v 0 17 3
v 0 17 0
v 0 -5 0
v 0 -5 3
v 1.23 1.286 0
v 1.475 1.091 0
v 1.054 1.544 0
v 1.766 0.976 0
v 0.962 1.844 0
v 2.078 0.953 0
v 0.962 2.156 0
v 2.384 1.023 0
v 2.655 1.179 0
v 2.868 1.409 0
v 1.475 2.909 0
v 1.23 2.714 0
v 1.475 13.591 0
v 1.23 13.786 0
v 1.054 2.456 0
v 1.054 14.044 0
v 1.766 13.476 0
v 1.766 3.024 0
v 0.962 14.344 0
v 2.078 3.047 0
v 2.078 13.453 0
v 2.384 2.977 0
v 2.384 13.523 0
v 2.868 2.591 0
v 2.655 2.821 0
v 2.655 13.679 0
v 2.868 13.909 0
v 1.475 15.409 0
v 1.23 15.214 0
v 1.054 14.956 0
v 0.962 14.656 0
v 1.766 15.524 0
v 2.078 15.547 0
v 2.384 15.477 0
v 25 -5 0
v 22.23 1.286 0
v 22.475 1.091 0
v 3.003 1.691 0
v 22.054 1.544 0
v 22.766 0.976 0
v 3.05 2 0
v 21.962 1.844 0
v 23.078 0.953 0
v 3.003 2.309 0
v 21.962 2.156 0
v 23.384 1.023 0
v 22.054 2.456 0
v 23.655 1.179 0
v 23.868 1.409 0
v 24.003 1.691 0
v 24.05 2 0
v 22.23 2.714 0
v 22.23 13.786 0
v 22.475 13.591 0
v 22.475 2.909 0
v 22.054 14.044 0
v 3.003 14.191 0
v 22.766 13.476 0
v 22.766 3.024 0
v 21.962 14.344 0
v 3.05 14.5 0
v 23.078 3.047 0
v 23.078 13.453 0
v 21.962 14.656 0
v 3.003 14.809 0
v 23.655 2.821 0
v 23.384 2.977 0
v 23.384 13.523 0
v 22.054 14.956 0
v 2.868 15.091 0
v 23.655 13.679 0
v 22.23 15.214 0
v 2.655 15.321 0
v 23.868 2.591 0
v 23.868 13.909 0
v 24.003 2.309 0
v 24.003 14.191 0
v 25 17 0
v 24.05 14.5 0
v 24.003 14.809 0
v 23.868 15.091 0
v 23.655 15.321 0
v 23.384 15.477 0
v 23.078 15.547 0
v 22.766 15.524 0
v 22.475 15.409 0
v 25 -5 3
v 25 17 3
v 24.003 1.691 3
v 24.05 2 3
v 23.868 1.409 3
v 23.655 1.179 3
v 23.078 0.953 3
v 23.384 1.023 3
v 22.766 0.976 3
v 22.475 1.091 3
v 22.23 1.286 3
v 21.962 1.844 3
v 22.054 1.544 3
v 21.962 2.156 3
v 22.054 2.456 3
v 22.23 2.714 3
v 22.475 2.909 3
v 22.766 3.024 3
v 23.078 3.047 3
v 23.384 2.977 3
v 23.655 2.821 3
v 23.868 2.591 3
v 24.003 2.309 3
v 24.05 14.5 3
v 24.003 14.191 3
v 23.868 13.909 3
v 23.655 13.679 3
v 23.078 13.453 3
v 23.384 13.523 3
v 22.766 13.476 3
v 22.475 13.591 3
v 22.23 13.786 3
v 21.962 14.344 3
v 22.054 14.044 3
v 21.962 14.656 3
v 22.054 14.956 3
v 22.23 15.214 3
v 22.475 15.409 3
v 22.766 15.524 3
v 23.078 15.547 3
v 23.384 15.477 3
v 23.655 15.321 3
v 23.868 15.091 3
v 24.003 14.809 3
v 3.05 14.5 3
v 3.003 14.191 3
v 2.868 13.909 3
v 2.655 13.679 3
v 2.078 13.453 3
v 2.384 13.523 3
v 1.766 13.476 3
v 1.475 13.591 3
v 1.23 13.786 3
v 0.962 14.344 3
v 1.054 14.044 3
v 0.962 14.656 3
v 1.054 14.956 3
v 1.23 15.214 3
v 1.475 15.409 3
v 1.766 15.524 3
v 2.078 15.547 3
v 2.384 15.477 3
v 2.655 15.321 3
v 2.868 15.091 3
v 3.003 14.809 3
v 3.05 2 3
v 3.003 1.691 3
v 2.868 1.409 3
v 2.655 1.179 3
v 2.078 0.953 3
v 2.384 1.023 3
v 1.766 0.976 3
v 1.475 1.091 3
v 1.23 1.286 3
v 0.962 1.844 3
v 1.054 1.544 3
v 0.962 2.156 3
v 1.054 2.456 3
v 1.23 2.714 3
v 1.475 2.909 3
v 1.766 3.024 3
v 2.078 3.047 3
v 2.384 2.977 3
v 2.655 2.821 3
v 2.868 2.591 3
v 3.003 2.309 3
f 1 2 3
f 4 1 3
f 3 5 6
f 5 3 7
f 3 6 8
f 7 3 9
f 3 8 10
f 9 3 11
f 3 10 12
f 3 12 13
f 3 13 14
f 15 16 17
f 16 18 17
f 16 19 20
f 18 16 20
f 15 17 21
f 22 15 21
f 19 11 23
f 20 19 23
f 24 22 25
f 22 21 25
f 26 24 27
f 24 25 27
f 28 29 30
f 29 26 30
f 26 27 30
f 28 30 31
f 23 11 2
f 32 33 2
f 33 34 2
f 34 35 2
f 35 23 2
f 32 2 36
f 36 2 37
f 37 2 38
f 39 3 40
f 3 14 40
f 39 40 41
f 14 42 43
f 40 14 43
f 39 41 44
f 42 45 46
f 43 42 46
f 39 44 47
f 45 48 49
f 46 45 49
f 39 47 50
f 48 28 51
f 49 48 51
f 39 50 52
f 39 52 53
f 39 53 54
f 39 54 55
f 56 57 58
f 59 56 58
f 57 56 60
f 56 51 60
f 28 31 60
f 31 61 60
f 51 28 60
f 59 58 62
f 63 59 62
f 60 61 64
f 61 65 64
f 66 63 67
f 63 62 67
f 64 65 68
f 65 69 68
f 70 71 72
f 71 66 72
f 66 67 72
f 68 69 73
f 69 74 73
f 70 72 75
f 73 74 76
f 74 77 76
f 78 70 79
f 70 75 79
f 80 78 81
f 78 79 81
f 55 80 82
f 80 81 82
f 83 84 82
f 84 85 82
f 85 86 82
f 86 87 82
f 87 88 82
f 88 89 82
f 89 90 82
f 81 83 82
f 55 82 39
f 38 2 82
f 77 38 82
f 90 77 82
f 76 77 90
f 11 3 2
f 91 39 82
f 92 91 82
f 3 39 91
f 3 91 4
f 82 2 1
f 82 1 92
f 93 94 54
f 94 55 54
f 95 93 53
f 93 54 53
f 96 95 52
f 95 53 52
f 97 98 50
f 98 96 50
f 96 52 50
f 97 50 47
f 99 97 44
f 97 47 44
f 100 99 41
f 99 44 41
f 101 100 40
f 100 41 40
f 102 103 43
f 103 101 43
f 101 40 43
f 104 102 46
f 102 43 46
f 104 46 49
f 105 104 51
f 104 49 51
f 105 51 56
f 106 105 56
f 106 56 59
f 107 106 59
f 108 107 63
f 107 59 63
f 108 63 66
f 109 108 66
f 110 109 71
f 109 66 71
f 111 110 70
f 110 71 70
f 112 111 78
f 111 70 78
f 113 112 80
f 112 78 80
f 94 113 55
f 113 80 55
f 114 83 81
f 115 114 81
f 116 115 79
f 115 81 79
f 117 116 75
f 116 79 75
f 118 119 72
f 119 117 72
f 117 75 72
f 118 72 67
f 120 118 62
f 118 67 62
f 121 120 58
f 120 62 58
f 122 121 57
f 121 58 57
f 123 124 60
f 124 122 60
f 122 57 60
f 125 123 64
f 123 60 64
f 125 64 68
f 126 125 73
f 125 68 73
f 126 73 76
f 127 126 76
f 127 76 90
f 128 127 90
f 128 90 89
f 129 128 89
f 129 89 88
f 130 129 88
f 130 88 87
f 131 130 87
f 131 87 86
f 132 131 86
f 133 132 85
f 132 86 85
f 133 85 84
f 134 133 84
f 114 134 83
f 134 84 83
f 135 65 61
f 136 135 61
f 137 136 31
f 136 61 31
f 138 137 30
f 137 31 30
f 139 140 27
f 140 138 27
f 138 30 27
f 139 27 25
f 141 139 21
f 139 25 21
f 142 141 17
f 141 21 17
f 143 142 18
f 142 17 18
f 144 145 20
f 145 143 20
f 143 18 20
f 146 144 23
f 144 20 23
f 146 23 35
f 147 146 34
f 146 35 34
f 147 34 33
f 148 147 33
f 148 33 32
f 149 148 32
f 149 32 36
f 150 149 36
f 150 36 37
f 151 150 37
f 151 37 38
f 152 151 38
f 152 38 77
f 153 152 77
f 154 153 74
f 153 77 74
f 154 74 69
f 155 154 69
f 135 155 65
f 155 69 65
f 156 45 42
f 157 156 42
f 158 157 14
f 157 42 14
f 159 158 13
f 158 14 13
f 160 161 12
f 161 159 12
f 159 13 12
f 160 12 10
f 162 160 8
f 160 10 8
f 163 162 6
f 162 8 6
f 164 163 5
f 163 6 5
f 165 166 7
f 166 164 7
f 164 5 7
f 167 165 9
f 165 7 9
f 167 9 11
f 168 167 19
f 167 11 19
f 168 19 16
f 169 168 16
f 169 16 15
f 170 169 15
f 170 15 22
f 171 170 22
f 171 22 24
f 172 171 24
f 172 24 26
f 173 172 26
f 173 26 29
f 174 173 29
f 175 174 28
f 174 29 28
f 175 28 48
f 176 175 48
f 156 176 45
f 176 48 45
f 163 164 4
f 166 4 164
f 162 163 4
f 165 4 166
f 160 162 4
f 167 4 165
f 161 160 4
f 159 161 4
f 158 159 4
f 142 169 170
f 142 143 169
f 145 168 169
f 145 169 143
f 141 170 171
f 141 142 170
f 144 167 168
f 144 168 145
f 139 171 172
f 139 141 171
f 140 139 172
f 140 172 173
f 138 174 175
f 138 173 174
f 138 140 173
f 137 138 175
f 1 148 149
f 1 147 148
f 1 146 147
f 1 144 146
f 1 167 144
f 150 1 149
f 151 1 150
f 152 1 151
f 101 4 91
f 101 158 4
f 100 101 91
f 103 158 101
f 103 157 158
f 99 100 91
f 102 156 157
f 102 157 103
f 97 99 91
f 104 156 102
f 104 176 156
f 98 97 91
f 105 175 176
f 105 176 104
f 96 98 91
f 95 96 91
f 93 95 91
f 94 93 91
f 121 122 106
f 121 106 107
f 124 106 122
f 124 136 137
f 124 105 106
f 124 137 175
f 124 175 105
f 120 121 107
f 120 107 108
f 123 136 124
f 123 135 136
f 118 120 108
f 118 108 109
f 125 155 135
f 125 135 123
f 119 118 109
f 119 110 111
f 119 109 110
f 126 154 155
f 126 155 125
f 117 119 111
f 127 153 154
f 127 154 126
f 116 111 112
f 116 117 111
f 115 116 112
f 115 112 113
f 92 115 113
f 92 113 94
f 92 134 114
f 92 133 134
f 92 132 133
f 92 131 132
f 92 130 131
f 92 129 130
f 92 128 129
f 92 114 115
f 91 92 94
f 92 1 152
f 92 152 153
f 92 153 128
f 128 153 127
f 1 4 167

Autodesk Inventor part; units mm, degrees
ref_plane "YZ Plane" through (0, 0, 0) normal (1, 0, 0) x (0, 1, 0)
ref_plane "XZ Plane" through (0, 0, 0) normal (0, 1, 0) x (-1, 0, 0)
ref_plane "XY Plane" through (0, 0, 0) normal (0, 0, 1) x (1, 0, 0)
sketch "Boceto1" plane through (0, 0, 0) normal (0, 0, 1) x (1, 0, 0)
  line L0 (0, 0) -> (25, 0)
  line L1 (25, 0) -> (25, 24)
  line L2 (25, 24) -> (0, 24)
  line L3 (0, 24) -> (0, 0)
  circle A0 centre (2, 2) radius 1.05
  circle A1 centre (23, 2) radius 1.05
  circle A2 centre (2, 14.5) radius 1.05
  circle A3 centre (23, 14.5) radius 1.05
  line L4 (0, 17) -> (25, 17)
  line L5 (0, 0) -> (25, 0)
  line L6 (25, 0) -> (25, -5)
  line L7 (25, -5) -> (0, -5)
  line L8 (0, -5) -> (0, 0)
  dimension "d0" = 25
  dimension "d1" = 24
  dimension "d2" = 2.1
  dimension "d3" = 2
  dimension "d4" = 2
  dimension "d7" = 21
  dimension "d10" = 12.5
  dimension "d13" = 7
  dimension "d14" = 5
extrude "Extrusión1" add sketch "Boceto1" along normal blind 3 contours L3 L4 L1 L0 | L0 L6 L7 L8
properties part number "Sujetador_camara"
